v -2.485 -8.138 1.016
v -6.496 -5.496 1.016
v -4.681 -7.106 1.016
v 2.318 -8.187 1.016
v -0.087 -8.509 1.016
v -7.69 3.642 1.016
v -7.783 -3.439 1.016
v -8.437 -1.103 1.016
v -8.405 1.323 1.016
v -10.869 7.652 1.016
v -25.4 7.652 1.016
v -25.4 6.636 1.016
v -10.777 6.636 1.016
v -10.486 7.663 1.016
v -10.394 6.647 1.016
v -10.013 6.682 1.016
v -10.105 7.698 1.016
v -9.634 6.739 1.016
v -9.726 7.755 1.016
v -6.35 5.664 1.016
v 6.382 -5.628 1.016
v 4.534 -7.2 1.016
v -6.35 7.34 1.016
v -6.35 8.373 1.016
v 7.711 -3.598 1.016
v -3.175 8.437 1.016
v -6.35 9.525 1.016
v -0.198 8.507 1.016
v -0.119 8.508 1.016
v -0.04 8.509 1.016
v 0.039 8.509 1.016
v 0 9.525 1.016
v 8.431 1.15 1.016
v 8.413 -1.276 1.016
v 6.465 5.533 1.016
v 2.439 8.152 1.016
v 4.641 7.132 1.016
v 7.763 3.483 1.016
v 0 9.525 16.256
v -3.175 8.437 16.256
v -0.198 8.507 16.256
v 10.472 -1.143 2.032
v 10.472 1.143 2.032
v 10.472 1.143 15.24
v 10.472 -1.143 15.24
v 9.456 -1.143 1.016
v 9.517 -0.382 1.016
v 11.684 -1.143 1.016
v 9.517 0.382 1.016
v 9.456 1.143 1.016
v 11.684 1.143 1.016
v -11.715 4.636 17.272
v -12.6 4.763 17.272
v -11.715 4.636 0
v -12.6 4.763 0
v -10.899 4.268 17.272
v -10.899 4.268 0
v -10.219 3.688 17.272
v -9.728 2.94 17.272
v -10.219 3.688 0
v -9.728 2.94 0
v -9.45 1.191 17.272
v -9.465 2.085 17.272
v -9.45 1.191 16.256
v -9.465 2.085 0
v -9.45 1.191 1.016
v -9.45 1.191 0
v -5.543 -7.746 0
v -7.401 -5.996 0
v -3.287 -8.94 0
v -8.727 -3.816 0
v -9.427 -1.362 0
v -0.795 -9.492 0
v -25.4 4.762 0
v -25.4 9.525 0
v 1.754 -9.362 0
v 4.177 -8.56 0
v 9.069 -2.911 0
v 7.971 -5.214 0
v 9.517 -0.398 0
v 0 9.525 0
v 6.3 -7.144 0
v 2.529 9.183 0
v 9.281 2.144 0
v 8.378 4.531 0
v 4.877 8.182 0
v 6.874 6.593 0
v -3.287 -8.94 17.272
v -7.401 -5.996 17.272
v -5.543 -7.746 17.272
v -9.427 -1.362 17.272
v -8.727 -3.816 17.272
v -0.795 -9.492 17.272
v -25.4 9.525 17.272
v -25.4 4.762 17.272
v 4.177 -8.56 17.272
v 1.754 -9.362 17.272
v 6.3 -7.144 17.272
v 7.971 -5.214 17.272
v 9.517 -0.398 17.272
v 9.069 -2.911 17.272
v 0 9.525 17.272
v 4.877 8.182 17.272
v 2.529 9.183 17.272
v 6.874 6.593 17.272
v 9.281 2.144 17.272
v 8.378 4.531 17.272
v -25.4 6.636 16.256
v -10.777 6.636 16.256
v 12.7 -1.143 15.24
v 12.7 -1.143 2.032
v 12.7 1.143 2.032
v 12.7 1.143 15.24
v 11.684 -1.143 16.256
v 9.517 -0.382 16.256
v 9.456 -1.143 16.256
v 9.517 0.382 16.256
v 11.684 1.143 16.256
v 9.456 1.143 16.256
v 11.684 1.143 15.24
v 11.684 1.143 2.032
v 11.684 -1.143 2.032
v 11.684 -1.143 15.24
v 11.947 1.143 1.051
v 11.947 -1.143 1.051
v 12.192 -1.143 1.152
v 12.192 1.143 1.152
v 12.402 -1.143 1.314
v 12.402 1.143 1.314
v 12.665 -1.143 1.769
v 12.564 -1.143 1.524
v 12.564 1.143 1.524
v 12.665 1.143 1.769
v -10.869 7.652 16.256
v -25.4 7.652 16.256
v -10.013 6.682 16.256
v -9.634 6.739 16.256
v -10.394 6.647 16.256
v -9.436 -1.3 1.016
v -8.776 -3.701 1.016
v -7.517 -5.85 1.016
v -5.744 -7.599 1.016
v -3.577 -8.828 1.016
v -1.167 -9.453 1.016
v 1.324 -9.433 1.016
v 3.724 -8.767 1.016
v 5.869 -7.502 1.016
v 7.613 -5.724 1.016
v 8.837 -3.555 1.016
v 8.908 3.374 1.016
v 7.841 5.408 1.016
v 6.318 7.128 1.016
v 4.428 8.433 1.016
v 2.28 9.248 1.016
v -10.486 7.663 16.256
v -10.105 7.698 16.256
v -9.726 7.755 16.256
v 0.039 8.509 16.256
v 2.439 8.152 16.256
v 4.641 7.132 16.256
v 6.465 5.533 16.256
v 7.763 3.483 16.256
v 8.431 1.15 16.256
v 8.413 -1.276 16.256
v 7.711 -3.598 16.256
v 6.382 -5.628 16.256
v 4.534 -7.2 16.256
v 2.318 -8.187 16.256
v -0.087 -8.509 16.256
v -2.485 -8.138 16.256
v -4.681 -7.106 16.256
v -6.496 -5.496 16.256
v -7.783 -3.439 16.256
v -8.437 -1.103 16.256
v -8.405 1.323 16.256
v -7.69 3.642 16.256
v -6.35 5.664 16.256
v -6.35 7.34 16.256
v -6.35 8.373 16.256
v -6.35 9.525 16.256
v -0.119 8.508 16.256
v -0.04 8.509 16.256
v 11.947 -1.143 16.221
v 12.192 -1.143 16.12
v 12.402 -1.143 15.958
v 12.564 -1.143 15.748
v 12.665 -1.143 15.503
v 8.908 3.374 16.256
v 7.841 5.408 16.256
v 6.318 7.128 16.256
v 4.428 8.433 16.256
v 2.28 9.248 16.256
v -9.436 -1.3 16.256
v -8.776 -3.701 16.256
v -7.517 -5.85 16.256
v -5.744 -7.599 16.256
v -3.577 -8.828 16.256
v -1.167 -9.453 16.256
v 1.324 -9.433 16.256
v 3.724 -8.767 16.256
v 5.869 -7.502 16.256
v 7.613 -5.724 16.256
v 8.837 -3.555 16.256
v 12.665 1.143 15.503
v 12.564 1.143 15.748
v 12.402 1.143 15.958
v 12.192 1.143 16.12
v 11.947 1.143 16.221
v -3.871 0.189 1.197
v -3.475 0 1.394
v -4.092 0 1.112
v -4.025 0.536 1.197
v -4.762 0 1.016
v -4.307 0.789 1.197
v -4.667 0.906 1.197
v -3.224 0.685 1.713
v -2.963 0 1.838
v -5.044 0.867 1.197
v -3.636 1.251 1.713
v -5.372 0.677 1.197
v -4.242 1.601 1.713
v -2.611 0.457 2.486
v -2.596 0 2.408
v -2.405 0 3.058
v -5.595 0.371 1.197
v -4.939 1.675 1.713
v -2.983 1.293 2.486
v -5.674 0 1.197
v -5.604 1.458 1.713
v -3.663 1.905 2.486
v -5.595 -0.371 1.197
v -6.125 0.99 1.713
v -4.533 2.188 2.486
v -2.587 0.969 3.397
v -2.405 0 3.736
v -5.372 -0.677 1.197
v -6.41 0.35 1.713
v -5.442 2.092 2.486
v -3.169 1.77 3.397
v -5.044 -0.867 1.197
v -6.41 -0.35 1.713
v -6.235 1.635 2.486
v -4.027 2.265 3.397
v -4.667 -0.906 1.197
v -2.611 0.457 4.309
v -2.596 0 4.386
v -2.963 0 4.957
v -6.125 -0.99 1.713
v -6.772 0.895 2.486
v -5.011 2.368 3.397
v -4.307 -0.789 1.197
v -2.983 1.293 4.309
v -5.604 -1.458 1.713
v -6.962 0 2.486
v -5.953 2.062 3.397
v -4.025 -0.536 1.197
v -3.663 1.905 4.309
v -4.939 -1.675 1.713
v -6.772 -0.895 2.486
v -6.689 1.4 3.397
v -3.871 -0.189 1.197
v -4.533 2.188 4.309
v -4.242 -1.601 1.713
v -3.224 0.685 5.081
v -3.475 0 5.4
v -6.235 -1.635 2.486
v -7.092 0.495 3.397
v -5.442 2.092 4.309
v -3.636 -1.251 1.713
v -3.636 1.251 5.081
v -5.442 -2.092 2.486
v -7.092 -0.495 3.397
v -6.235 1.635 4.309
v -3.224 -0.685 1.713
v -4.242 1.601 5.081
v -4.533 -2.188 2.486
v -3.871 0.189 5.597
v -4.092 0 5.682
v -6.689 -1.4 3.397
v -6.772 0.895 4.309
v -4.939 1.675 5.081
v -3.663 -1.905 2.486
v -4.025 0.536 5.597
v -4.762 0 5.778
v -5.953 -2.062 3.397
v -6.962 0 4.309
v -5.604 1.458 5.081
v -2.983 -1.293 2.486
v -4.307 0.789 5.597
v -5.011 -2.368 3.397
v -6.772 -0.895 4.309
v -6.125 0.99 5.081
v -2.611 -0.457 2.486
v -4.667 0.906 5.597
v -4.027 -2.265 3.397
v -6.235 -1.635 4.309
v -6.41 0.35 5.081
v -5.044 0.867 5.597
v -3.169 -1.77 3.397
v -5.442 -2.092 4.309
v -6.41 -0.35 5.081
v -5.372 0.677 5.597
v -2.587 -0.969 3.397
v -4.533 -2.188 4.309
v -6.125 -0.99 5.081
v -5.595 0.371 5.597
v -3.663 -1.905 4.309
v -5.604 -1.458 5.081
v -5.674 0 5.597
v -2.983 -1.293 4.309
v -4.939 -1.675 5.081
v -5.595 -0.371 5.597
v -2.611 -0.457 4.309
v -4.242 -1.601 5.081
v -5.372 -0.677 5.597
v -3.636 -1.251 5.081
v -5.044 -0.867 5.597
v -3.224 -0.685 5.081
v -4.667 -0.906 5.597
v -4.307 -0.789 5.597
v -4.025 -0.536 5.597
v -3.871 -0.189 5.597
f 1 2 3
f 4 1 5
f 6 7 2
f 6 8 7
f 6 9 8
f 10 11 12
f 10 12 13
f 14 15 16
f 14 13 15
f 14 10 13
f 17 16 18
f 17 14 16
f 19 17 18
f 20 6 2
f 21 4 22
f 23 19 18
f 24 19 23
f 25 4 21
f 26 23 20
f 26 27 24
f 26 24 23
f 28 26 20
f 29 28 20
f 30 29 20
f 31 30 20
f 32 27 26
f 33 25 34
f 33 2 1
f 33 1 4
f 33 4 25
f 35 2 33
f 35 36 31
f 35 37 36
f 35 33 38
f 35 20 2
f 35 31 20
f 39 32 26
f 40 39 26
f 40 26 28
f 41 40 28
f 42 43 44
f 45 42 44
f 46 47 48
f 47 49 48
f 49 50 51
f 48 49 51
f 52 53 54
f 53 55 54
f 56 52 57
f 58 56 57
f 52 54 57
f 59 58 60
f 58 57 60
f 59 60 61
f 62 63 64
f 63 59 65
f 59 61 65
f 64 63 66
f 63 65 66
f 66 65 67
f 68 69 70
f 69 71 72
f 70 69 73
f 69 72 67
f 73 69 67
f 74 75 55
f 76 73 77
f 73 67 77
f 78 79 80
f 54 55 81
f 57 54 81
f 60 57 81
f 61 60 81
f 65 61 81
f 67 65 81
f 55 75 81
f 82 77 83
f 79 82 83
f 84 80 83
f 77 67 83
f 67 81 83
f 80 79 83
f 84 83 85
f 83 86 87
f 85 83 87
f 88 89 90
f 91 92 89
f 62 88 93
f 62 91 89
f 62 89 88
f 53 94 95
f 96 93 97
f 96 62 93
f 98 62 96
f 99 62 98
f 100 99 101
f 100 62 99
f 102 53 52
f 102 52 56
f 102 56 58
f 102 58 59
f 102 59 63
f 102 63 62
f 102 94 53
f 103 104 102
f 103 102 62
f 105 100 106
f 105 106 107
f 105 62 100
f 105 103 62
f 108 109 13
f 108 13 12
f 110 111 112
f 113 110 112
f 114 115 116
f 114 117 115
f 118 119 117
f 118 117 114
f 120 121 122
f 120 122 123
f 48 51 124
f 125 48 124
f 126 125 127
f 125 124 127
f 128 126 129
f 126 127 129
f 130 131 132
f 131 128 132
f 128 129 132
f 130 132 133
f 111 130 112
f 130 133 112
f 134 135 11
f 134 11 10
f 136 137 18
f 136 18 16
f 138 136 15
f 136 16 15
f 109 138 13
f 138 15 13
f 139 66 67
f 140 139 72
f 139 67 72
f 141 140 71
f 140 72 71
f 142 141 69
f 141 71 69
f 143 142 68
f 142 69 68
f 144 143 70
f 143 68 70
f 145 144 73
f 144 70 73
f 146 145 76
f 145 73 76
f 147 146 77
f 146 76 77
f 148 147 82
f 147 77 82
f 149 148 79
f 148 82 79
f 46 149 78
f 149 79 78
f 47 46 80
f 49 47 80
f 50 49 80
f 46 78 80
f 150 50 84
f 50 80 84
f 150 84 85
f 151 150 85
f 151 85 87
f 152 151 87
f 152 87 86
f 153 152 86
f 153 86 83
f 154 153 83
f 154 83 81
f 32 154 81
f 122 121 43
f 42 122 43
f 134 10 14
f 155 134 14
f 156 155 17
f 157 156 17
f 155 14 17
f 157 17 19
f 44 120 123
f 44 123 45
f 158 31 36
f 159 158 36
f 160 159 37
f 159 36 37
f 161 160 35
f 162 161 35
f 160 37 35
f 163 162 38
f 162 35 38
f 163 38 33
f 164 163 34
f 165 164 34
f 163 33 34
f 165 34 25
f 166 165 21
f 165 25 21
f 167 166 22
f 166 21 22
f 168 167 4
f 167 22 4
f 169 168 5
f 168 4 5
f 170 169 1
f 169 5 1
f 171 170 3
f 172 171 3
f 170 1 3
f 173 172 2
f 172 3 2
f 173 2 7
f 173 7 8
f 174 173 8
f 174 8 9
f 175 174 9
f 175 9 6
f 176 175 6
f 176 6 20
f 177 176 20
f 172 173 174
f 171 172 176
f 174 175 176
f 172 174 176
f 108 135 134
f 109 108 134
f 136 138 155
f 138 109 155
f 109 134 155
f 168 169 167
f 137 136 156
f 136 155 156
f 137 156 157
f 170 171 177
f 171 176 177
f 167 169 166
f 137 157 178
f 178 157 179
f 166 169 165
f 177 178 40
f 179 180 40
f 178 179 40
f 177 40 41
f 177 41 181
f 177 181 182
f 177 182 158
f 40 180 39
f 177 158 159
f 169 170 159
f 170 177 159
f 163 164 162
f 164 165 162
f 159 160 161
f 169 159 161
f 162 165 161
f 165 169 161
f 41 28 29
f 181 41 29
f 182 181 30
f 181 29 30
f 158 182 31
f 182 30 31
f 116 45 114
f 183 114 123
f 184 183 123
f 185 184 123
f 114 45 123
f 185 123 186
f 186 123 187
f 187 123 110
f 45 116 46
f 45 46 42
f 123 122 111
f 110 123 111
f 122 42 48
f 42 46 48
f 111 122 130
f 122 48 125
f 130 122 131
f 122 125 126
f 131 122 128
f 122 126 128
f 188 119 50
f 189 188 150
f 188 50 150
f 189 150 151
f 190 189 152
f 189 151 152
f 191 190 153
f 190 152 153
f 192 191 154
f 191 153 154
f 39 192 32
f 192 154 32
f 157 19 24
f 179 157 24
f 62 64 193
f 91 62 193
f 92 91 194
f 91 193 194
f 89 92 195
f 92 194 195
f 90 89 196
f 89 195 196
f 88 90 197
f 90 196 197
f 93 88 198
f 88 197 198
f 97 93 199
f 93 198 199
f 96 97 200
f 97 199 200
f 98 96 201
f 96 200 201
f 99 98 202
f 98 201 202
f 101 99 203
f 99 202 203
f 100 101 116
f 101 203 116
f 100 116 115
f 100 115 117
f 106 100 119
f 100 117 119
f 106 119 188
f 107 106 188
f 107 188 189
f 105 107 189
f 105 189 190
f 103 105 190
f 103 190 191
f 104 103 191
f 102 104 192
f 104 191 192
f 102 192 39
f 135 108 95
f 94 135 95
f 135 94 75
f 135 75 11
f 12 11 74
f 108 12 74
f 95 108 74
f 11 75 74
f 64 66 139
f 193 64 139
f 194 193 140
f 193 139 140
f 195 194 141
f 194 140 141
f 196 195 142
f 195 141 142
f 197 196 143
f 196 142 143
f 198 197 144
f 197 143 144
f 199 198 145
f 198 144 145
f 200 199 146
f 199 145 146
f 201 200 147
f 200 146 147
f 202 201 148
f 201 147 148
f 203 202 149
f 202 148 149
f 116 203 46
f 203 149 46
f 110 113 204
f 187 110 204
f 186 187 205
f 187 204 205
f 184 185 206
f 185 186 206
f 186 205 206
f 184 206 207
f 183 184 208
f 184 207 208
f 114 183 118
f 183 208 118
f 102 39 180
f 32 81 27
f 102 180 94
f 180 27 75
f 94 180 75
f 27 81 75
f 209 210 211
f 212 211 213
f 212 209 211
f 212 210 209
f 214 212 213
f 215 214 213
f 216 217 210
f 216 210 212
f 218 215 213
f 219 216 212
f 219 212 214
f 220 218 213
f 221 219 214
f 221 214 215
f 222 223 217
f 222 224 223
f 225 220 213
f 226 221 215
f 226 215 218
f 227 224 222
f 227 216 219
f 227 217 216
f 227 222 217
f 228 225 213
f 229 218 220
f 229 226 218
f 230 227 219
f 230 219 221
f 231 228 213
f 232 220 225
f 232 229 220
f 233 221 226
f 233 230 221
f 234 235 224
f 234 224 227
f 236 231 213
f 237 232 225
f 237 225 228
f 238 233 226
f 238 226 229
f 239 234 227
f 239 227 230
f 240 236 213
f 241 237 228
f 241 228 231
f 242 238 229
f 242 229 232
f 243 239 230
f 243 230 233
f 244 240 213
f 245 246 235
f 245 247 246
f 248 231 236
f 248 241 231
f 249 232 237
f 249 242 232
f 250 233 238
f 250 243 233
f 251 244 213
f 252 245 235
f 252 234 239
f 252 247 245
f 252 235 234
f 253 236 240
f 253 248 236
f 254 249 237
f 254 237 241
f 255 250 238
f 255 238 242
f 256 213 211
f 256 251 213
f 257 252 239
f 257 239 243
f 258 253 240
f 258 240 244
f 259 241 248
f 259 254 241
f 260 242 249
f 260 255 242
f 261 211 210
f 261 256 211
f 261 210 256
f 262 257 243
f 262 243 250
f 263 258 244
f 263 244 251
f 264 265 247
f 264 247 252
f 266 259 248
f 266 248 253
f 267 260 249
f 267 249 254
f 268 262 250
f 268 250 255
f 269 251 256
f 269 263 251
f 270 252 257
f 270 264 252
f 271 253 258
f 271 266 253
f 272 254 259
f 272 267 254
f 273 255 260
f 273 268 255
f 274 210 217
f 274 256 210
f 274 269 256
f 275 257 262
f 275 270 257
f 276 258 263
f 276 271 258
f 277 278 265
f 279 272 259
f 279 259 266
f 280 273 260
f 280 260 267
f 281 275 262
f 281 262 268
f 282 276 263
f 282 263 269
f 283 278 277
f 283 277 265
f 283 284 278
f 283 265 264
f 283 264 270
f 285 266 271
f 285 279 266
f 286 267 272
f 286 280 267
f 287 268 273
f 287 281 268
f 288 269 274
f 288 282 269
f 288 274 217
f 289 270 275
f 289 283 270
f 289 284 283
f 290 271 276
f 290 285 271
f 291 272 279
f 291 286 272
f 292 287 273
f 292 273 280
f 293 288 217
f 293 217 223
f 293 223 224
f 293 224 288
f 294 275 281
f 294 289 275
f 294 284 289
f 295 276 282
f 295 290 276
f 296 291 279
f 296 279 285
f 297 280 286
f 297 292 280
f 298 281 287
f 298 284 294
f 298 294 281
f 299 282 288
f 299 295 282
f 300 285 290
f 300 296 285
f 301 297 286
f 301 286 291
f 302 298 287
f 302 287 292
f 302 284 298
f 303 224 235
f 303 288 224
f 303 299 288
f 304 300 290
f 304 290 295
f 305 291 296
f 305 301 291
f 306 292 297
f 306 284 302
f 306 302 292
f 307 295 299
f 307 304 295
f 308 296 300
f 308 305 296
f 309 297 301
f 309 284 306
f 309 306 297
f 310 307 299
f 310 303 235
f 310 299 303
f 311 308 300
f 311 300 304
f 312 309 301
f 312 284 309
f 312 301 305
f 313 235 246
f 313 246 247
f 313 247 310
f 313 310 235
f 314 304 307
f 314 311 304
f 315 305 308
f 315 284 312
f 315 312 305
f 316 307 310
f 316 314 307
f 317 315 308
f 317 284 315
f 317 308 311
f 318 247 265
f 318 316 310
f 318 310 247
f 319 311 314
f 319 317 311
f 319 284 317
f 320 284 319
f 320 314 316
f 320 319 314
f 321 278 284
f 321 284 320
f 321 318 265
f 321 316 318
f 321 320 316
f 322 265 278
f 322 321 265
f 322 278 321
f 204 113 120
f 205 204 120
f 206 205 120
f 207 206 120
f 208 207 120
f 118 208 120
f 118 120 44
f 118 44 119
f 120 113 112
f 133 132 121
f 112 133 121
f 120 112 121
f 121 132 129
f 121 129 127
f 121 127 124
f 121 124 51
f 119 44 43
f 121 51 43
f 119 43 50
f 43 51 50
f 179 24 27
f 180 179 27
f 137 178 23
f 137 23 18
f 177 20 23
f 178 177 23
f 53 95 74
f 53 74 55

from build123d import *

# Parameters (mm, degrees)
F1_DEPTH = 1.016
F3_DEPTH = 15.24
F7_DEPTH = 1.016
F8_W     = 1.211829
F8_H     = 13.208
F9_DEPTH = 25.4


with BuildPart() as f1:
    # F0 (on Top) → F1 (new body)
    with BuildSketch(Plane.XY):
        with BuildLine():
            ThreePointArc((-12.600391, 4.7625), (-10.219141, 3.687565), (-9.450293, 1.190625))
            ThreePointArc((-9.450293, 1.190625), (6.300195, -7.14375), (0, 9.525))
            Line((0, 9.525), (-6.35, 9.525))
            Line((-6.35, 9.525), (-25.4, 9.525))
            Line((-25.4, 9.525), (-25.4, 7.65175))
            Line((-25.4, 7.65175), (-25.4, 6.63575))
            Line((-25.4, 6.63575), (-25.4, 4.7625))
            Line((-25.4, 4.7625), (-12.600391, 4.7625))
        make_face()
    extrude(amount=F1_DEPTH)

    # F2 (on face) → F3 (join)
    with BuildSketch(Plane.XY.offset(1.016)):
        with BuildLine():
            Line((-10.776599, 6.63575), (-25.4, 6.63575))
            Line((-25.4, 6.63575), (-25.4, 4.7625))
            Line((-25.4, 4.7625), (-12.600391, 4.7625))
            ThreePointArc((-12.600391, 4.7625), (-10.219141, 3.687565), (-9.450293, 1.190625))
            ThreePointArc((-9.450293, 1.190625), (-1.166816, -9.453262), (9.456171, -1.143))
            ThreePointArc((9.456171, -1.143), (9.525, 0), (9.456171, 1.143))
            ThreePointArc((9.456171, 1.143), (6.31817, 7.127857), (0, 9.525))
            Line((0, 9.525), (-3.175, 8.437357))
            Line((-3.175, 8.437357), (-0.198135, 8.506693))
            ThreePointArc((-0.198135, 8.506693), (-0.079436, 8.508629), (0.039278, 8.508909))
            ThreePointArc((0.039278, 8.508909), (3.461173, -7.773247), (-6.35, 5.663972))
            Line((-6.35, 5.663972), (-6.35, 7.34013))
            Line((-6.35, 7.34013), (-9.633965, 6.7394))
            ThreePointArc((-9.633965, 6.7394), (-10.202936, 6.661716), (-10.776599, 6.63575))
        make_face()
        with BuildLine():
            Line((-25.4, 9.525), (-25.4, 7.65175))
            Line((-25.4, 7.65175), (-10.868761, 7.65175))
            ThreePointArc((-10.868761, 7.65175), (-10.295099, 7.677716), (-9.726128, 7.7554))
            Line((-9.726128, 7.7554), (-6.35, 8.372989))
            Line((-6.35, 8.372989), (-6.35, 9.525))
            Line((-6.35, 9.525), (-25.4, 9.525))
        make_face()
        with BuildLine():
            Line((12.7, 1.143), (9.456171, 1.143))
            ThreePointArc((9.456171, 1.143), (9.525, 0), (9.456171, -1.143))
            Line((9.456171, -1.143), (12.7, -1.143))
            Line((12.7, -1.143), (12.7, 1.143))
        make_face()
    extrude(amount=F3_DEPTH)

    # F6 (on face) → F7 (join)
    with BuildSketch(Plane.XY.offset(16.256)):
        with BuildLine():
            Line((-6.35, 9.525), (-25.4, 9.525))
            Line((-25.4, 9.525), (-25.4, 4.7625))
            Line((-25.4, 4.7625), (-12.600391, 4.7625))
            ThreePointArc((-12.600391, 4.7625), (-10.219141, 3.687565), (-9.450293, 1.190625))
            ThreePointArc((-9.450293, 1.190625), (6.300195, -7.14375), (0, 9.525))
            Line((0, 9.525), (-6.35, 9.525))
        make_face()
    extrude(amount=F7_DEPTH)

    # F8 (on face) → F9 (cut)
    with BuildSketch(Plane(origin=(0, 1.143, 0), x_dir=(-1, 0, 0), z_dir=(0, 1, 0))):
        with BuildLine():
            ThreePointArc((-11.684, 1.016), (-12.40242, 1.31358), (-12.7, 2.032))
            Line((-12.7, 2.032), (-12.7, 1.016))
            Line((-12.7, 1.016), (-11.684, 1.016))
        make_face()
        with BuildLine():
            Line((-12.7, 16.256), (-12.7, 15.24))
            ThreePointArc((-12.7, 15.24), (-12.40242, 15.95842), (-11.684, 16.256))
            Line((-11.684, 16.256), (-12.7, 16.256))
        make_face()
        with Locations((-11.078086, 8.636)):
            Rectangle(F8_W, F8_H)
    extrude(amount=-F9_DEPTH, mode=Mode.SUBTRACT)


with BuildPart() as f5:
    # F4 (on Front) → F5 (revolve)
    with BuildSketch(Plane.XZ):
        with BuildLine():
            Line((-4.7625, 1.524), (-4.7625, 1.016))
            ThreePointArc((-4.7625, 1.016), (-2.38125, 3.39725), (-4.7625, 5.7785))
            Line((-4.7625, 5.7785), (-4.7625, 5.2705))
            Line((-4.7625, 5.2705), (-4.7625, 1.524))
        make_face()
    revolve(axis=Axis((-4.7625, 0, 5.122851), (0, 0, 1)))


solid = Compound([f1.part, f5.part])
